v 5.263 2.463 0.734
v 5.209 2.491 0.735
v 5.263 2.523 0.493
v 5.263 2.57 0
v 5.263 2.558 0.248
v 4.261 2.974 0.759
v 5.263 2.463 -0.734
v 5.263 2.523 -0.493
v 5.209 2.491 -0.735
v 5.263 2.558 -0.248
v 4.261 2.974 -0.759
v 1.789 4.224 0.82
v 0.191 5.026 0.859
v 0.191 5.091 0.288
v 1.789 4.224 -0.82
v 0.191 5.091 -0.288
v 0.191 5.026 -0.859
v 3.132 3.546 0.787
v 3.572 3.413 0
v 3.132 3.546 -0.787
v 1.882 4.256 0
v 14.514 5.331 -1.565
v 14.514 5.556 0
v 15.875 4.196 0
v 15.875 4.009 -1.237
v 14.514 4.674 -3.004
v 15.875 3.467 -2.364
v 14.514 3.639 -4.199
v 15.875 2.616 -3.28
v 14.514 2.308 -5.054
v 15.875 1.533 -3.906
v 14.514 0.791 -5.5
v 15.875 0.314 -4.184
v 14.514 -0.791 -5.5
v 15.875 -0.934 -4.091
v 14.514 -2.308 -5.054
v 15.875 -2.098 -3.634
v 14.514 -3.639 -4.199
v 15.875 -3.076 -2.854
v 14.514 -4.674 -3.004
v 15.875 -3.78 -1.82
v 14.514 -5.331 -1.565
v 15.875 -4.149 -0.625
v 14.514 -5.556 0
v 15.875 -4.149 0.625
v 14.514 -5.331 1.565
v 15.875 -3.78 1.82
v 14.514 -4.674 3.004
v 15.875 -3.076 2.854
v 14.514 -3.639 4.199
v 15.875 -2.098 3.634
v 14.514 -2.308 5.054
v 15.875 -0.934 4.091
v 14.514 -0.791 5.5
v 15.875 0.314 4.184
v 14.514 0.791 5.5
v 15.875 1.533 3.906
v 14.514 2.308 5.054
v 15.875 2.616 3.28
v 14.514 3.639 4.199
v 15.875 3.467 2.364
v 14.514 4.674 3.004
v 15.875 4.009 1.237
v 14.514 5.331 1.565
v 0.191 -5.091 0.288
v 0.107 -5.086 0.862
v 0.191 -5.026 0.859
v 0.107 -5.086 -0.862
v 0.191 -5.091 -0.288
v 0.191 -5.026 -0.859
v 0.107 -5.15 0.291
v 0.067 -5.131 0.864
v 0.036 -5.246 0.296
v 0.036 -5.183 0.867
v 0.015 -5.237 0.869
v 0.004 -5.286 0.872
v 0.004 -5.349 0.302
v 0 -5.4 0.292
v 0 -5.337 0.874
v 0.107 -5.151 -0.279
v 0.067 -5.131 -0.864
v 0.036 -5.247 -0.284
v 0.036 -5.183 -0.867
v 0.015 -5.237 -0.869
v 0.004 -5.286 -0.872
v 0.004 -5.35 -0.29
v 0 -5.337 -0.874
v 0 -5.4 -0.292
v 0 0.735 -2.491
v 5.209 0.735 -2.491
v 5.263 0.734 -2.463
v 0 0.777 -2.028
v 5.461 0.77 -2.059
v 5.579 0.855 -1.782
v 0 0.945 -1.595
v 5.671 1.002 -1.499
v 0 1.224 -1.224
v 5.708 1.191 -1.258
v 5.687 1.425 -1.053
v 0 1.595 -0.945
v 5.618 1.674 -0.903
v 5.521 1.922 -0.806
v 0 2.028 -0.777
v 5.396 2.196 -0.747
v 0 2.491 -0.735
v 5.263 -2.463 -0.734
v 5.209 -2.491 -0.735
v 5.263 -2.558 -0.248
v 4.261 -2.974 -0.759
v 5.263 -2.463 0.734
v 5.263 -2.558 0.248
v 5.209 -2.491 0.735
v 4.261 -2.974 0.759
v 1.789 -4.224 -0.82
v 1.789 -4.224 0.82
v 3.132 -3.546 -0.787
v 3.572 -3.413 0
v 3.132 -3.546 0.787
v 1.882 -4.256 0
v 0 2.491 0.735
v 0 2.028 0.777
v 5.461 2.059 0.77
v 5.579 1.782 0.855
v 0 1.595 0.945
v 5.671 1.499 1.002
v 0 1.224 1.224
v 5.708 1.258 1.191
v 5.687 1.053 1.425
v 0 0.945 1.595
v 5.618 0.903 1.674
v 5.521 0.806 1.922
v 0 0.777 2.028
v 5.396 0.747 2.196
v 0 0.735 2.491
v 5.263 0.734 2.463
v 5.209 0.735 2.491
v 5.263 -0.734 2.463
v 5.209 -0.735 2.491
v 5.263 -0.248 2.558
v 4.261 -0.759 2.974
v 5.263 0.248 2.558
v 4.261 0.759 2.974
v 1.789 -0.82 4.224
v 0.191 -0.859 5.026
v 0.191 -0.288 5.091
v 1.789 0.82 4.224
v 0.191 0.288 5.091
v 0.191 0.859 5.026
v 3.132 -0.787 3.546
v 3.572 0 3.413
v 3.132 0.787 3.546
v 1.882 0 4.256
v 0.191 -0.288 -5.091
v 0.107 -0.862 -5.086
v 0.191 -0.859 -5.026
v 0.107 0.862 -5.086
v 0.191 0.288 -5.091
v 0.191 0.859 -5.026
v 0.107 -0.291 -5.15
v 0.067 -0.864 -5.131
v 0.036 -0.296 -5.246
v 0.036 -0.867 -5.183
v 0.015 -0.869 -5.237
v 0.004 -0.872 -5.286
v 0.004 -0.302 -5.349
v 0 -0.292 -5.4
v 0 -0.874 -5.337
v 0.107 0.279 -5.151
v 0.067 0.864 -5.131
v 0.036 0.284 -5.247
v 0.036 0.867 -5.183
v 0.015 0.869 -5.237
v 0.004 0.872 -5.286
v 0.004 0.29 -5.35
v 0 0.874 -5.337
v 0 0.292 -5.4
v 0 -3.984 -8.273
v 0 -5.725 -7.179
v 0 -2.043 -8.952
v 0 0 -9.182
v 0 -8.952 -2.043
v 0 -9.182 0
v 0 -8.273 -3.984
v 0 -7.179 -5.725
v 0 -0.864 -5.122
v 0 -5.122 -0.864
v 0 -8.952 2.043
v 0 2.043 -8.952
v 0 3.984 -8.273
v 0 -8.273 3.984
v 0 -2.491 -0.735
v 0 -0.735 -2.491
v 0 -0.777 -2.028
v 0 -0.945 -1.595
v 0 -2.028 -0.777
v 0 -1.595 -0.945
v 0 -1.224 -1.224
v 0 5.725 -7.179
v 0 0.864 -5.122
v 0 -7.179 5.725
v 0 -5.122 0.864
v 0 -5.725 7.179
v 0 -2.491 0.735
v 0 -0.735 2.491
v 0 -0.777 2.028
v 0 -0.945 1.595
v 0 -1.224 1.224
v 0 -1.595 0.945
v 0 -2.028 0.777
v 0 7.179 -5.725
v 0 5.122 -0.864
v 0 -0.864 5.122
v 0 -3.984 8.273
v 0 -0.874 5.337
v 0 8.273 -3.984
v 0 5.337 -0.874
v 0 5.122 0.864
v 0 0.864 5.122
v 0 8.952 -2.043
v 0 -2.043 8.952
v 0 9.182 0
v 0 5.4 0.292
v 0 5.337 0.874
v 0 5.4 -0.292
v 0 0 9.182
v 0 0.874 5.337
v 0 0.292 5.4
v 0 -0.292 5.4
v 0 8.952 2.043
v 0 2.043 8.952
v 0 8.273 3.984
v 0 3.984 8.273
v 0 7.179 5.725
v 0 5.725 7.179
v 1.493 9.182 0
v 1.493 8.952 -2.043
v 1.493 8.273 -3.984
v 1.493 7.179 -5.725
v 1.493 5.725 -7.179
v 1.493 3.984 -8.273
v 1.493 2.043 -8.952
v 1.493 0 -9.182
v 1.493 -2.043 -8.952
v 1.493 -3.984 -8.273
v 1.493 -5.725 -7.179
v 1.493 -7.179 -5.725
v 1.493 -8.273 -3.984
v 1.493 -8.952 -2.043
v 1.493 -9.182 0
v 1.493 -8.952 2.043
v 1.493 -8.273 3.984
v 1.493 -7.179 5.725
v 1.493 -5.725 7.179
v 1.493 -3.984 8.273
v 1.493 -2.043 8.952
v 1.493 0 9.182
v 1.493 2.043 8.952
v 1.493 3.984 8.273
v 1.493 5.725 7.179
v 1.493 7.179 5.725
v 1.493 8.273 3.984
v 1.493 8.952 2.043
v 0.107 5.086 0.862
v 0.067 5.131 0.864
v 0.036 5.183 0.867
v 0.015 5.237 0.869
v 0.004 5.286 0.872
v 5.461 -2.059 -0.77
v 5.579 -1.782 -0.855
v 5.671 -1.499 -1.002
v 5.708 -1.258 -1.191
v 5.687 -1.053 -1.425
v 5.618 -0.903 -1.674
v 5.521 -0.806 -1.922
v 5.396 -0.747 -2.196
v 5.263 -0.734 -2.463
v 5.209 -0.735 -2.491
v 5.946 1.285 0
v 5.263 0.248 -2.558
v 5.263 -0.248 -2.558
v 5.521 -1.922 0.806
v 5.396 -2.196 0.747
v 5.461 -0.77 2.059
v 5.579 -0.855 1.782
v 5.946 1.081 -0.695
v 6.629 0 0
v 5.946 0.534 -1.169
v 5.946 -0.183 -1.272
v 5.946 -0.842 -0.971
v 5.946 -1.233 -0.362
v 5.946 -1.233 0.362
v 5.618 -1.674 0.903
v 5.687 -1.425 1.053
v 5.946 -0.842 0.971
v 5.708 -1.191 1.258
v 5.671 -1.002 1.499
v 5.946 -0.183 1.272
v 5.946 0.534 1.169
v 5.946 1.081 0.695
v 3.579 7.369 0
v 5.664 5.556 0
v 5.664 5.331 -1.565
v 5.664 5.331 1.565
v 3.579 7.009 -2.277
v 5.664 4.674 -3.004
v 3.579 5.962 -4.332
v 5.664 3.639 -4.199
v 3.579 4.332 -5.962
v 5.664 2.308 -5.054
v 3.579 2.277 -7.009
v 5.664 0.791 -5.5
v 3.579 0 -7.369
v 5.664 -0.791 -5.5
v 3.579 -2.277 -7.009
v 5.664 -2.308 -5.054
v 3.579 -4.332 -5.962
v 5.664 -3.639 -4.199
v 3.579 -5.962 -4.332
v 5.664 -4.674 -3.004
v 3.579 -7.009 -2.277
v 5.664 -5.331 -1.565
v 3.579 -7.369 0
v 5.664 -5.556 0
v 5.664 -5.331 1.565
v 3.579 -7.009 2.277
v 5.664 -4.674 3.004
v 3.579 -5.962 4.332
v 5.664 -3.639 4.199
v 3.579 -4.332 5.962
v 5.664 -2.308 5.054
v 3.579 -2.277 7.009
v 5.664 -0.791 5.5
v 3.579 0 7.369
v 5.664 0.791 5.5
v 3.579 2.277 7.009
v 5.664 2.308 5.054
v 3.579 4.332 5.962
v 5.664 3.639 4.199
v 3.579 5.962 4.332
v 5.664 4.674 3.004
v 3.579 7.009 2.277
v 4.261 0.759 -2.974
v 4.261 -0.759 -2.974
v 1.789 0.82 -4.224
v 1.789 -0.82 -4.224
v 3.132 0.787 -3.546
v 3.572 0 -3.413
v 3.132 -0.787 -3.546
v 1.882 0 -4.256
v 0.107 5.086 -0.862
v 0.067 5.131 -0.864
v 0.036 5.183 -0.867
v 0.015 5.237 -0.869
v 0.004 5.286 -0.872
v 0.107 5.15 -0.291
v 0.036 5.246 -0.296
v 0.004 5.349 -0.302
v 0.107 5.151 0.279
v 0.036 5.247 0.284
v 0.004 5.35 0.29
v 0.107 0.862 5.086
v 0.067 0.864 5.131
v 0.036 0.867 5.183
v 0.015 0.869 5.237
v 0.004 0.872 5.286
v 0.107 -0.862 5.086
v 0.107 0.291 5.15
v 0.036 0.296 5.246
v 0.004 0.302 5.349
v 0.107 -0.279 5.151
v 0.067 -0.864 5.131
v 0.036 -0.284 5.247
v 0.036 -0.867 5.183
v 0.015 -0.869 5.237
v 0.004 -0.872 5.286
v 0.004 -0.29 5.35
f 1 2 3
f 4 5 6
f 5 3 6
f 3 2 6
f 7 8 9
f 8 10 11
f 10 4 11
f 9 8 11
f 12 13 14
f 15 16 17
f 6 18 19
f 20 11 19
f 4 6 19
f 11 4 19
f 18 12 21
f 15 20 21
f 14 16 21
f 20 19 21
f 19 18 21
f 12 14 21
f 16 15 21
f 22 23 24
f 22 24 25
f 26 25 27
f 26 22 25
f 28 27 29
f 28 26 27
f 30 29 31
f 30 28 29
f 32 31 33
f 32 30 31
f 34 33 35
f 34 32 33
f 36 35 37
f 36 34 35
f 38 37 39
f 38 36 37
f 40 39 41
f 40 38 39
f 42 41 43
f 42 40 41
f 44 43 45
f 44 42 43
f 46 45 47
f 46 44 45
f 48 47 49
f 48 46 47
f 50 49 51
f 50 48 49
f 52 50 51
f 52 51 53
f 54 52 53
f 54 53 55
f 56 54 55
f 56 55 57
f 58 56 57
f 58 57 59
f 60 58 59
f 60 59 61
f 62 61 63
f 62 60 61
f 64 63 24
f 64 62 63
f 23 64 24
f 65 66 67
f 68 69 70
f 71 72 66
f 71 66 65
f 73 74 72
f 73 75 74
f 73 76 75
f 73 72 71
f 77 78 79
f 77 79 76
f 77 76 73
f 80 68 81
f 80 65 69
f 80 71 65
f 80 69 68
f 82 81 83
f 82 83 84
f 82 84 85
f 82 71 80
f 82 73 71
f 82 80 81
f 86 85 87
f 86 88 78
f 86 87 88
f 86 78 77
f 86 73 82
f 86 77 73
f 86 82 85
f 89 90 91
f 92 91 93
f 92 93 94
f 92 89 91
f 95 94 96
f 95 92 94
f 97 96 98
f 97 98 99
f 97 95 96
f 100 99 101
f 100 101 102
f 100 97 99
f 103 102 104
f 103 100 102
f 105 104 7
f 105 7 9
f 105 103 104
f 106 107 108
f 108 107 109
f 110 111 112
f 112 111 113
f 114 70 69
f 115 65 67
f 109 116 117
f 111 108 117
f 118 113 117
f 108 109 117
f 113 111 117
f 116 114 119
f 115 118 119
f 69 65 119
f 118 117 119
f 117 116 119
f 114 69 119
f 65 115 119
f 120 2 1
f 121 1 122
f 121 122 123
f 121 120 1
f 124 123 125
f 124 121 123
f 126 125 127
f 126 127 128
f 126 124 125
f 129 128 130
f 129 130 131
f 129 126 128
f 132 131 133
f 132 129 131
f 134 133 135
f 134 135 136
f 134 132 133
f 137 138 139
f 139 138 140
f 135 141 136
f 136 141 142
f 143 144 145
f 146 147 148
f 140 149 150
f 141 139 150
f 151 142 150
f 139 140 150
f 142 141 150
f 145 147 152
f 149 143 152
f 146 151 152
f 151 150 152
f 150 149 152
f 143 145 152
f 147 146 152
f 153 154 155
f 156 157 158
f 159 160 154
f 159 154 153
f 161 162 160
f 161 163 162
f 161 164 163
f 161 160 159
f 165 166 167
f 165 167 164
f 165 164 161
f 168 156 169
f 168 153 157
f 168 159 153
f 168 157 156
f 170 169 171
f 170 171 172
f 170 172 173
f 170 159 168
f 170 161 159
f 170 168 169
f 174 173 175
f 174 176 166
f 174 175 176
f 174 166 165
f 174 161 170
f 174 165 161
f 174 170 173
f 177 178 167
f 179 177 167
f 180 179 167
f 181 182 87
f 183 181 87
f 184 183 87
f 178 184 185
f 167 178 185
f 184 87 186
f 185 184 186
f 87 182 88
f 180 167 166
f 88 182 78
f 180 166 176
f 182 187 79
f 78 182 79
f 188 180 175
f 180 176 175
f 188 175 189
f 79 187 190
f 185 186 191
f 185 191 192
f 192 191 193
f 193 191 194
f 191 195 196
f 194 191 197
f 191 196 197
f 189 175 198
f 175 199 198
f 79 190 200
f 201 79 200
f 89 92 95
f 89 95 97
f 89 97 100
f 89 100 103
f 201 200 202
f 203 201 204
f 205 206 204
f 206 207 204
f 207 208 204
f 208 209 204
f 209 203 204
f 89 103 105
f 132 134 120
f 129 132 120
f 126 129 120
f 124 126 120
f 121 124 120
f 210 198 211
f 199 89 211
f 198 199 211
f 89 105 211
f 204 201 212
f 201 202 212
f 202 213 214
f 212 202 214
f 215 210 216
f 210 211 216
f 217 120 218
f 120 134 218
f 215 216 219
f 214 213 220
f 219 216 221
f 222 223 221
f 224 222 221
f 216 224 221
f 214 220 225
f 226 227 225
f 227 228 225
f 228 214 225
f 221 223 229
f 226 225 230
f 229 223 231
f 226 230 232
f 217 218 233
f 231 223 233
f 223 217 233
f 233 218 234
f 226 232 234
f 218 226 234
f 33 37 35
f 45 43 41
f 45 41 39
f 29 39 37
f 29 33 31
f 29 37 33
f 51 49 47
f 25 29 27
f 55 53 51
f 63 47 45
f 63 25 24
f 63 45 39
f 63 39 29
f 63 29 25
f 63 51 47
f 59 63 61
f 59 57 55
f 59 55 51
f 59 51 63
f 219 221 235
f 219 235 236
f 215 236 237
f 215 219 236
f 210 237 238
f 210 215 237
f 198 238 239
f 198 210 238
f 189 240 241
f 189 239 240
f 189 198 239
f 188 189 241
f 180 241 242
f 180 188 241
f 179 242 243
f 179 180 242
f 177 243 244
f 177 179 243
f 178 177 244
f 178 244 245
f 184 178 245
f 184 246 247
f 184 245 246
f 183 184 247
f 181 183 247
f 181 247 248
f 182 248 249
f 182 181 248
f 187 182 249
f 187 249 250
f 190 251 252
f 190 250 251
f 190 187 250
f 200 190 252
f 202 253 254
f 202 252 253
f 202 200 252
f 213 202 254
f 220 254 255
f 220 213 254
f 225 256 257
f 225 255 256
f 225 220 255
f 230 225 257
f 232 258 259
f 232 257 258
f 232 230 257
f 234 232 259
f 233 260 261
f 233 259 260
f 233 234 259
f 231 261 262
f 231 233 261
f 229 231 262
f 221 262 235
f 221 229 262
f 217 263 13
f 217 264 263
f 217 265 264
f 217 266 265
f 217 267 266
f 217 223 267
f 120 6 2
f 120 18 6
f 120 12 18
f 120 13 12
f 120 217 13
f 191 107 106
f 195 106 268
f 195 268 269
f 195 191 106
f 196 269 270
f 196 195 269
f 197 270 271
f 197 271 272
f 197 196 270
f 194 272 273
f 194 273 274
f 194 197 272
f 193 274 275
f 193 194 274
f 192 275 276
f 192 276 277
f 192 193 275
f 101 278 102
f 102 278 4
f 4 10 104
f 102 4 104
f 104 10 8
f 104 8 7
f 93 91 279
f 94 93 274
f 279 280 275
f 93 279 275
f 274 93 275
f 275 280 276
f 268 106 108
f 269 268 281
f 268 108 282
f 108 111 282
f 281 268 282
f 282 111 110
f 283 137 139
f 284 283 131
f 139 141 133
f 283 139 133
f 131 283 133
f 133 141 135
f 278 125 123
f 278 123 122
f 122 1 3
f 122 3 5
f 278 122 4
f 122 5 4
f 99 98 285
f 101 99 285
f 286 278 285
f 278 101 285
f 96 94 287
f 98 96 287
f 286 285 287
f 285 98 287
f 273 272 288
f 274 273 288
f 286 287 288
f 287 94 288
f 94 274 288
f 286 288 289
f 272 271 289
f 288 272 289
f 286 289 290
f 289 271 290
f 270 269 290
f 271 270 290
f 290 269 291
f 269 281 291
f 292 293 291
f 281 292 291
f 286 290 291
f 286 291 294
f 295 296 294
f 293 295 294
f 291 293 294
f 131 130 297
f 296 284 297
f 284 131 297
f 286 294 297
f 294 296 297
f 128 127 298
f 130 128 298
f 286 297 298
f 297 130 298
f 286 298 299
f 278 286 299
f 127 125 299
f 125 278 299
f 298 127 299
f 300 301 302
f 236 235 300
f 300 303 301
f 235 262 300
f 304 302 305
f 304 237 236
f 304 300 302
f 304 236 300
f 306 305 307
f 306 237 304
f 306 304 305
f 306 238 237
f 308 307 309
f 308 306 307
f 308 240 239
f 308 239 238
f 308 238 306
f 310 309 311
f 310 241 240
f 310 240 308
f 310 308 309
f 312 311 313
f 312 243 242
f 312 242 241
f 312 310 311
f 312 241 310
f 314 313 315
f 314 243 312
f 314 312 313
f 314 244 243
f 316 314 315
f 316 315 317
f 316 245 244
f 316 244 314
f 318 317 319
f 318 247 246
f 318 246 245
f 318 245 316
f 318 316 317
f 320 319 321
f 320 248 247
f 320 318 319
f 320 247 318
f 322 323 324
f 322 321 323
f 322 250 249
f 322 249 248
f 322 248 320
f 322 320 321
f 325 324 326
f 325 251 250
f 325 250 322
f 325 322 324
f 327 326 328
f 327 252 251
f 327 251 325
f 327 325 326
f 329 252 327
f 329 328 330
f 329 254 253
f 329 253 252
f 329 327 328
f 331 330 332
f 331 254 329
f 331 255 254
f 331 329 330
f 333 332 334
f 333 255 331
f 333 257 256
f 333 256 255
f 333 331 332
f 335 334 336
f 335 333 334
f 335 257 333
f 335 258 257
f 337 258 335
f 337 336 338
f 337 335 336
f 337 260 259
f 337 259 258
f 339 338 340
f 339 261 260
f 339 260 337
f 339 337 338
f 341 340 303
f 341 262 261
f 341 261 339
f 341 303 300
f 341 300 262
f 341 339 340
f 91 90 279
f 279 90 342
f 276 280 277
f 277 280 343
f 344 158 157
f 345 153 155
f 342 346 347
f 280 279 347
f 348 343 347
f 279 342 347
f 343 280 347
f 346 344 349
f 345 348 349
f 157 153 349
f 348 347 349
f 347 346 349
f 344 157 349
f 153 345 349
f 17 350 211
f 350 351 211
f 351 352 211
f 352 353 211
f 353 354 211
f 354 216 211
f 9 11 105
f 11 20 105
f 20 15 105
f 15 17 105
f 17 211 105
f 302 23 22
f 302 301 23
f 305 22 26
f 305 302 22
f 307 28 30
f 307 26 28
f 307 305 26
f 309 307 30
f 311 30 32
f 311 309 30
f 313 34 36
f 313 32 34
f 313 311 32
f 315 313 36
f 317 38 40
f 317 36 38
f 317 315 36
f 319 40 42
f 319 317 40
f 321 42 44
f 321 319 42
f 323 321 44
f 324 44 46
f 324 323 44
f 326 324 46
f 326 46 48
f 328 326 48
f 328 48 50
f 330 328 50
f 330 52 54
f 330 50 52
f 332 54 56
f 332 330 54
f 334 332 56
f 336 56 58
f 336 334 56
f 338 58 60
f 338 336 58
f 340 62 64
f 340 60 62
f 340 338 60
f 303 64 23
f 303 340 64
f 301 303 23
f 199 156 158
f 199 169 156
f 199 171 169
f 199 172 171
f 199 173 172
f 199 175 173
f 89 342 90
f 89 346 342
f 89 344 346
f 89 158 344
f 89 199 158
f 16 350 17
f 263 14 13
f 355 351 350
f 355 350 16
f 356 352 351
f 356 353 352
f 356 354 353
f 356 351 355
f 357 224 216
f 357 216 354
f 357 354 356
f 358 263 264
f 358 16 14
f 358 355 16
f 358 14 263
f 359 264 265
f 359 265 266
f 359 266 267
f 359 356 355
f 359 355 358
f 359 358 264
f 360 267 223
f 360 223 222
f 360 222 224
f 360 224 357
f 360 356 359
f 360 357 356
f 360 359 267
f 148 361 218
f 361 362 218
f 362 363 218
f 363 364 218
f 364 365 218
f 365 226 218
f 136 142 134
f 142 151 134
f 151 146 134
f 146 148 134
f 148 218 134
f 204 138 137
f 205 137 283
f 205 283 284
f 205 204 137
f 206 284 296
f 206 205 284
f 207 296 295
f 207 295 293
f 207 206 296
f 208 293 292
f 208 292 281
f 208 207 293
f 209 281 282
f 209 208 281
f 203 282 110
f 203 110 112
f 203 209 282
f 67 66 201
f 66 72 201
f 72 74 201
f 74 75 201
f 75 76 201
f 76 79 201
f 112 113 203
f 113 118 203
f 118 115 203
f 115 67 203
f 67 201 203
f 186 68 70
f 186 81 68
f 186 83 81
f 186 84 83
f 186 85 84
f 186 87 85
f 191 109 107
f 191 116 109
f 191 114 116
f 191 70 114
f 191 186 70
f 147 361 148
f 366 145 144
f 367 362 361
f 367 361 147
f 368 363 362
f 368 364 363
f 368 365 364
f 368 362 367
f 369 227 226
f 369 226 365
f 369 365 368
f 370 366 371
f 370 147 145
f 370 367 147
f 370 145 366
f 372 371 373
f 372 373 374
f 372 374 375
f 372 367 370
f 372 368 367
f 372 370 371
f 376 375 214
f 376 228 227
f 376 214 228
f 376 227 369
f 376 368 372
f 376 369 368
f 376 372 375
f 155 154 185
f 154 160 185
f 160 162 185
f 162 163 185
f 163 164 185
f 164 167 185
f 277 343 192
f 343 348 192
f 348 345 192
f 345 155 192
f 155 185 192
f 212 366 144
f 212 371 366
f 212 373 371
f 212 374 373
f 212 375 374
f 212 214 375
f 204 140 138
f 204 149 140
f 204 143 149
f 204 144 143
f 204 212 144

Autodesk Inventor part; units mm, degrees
ref_plane "YZ Plane" through (0, 0, 0) normal (1, 0, 0) x (0, 1, 0)
ref_plane "XZ Plane" through (0, 0, 0) normal (0, 1, 0) x (-1, 0, 0)
sketch "Sketch1" plane through (0, 0, 0) normal (0, 0, 1) x (1, 0, 0)
  line L0 (6.6294, 0) -> (15.875, 0)
  line L1 (15.875, 0) -> (15.875, 5.5563)
  line L2 (15.875, 5.5563) -> (5.6642, 5.5563)
  line L3 (1.4931, 9.1821) -> (0, 9.1821)
  line L4 (-3.175, 0) -> (19.05, 0) projected
  line L5 (0, -1.8364) -> (0, 11.0185) projected
  line L6 (0, 5.1943) -> (5.2627, 2.5704)
  line L7 (5.2627, 2.5704) -> (6.6294, 0)
  line L8 (5.6642, 5.5563) -> (1.4931, 9.1821)
  line L9 (0, 9.1821) -> (0, 5.1943)
  dimension "d2" = 11.1125
  dimension "d3" = 18.3642
  dimension "d4" = 6.6294
  dimension "d5" = 10.3886
  dimension "d6" = 26.5
  dimension "d7" = 62
  dimension "d13" = 41
  dimension "d14" = 5.6642
  dimension "d15" = 15.875
revolve "Body" add sketch "Sketch1" angle 360 about axis through (6.6294, 0, 0) along (1, 0, 0) contours L7 L6 L5 L3 L8 L2 L1 L0
sketch "Sketch2" plane through (0, 0, 0) normal (-1, 0, 0) x (0, 0, 1)
  line L0 (0, -12.8549) -> (0, 12.8549) projected
  line L1 (-12.8549, 0) -> (12.8549, 0) projected
  line L2 (0, 5.1943) -> (0, 0) construction
  line L3 (0, 0) -> (5.1943, 0) construction
  arc A0 (1.7314, 0) -> (0, 1.7314) centre (0, 0) ccw
  line L4 (0, 0) -> (0.7947, 0.7947) construction
  arc A1 (2.5971, 0) -> (0, 2.5971) centre (0, 0) ccw construction
  line L5 (0.8636, 5.122) -> (0.7354, 2.4908)
  line L6 (5.122, 0.8636) -> (2.4908, 0.7354)
  arc A2 (0.7354, 2.4908) -> (2.4908, 0.7354) centre (2.4093, 2.4093) ccw
  arc A3 (5.1943, 0) -> (5.122, 0.8636) centre (0, 0) ccw
  arc A4 (0.8636, 5.122) -> (0, 5.1943) centre (0, 0) ccw
  arc A5 (5.122, 0.8636) -> (0.8636, 5.122) centre (0, 0) ccw
  line L7 (0.8636, -5.122) -> (0.7354, -2.4908)
  line L8 (5.122, -0.8636) -> (2.4908, -0.7354)
  arc A6 (2.4908, -0.7354) -> (0.7354, -2.4908) centre (2.4093, -2.4093) ccw
  arc A7 (5.122, -0.8636) -> (5.1943, 0) centre (0, 0) ccw
  arc A8 (0, -5.1943) -> (0.8636, -5.122) centre (0, 0) ccw
  arc A9 (0.8636, -5.122) -> (5.122, -0.8636) centre (0, 0) ccw
  line L9 (-0.8636, 5.122) -> (-0.7354, 2.4908)
  line L10 (-5.122, 0.8636) -> (-2.4908, 0.7354)
  arc A10 (-2.4908, 0.7354) -> (-0.7354, 2.4908) centre (-2.4093, 2.4093) ccw
  arc A11 (-5.122, 0.8636) -> (-5.1943, 0) centre (0, 0) ccw
  arc A12 (0, 5.1943) -> (-0.8636, 5.122) centre (0, 0) ccw
  arc A13 (-0.8636, 5.122) -> (-5.122, 0.8636) centre (0, 0) ccw
  arc A14 (-5.122, -0.8636) -> (-0.8636, -5.122) centre (0, 0) ccw
  arc A15 (-0.8636, -5.122) -> (0, -5.1943) centre (0, 0) ccw
  arc A16 (-5.1943, 0) -> (-5.122, -0.8636) centre (0, 0) ccw
  line L11 (-5.122, -0.8636) -> (-2.4908, -0.7354)
  arc A17 (-0.7354, -2.4908) -> (-2.4908, -0.7354) centre (-2.4093, -2.4093) ccw
  line L12 (-0.8636, -5.122) -> (-0.7354, -2.4908)
  dimension "d18" = 45
  dimension "d19" = 3.4629
  dimension "d20" = 5.1943
  dimension "d21" = 10.3886
  dimension "d22" = 0.8636
extrude "Slot" add sketch "Sketch2" against normal up to next contours A2 L5 A5 L6 | L9 A10 L10 A13 | L7 A6 L8 A9 | A14 L11 A17 L12
fillet "Fillet1" radius 0.3454 4 edges at (0, 5.1943, 0) (0, 0, 5.1943) (0, -5.1943, 0) (0, 0, -5.1943)
thread "Thread" size "7/16-14 UNC" class "2A" standard "ANSI Unified Screw Threads" length 5.6756
chamfer "Chamfer1" distance 1.3606 distance2 1.3606 1 edges at (15.875, -5.5563, 0) measured on face at (15.875, 2.9153, 1.1751)
ref_plane "Work Plane2" through (2.032, 0, 0) normal (0, 1, 0) x (1, 0, 0)
equation "\"d2\" = GD"
equation "\"d3\" = KOD"
equation "\"d4\" = INTI"
equation "\"d5\" = SDM"
equation "\"d13\" = 0.5 * SEWI"
equation "\"d14\" = KOH"
equation "\"d15\" = NLG"
equation "\"d19\" = 0.333333 * SDM"
equation "\"d20\" = 0.5 * SDM"
equation "\"d21\" = SDM"
equation "\"d22\" = 0.5 * SBR"
equation "\"d45\" = INTI"
equation "\"d25\" = 0.2 * SBR"
equation "\"d9\" = GEL"
equation "\"d11\" = -0.5 * SPD + 0.5 * GD"
equation "\"d12\" = GUL"
equation "\"GD\" = NND"
equation "\"NLG\" = 15.875"
equation "\"GEL\" = 5.67563"
equation "\"KOD\" = 18.3642"
equation "\"KOH\" = 5.6642"
equation "\"SDM\" = 10.3886"
equation "\"INTI\" = 6.6294"
equation "\"SBR\" = 1.7272"
equation "\"GUL\" = 0.75 * GAL"
equation "\"SPD\" = 8.3914"
equation "\"SEWI\" = 82deg"
equation "\"d0\" = NLG"
equation "\"d1\" = KOH"
equation "\"d17\" = SDM"
equation "\"TOA\" = 30deg"
equation "\"THREADDIA\" = 11.1125"
equation "\"BDM\" = NND"
equation "\"NND\" = 11.1125"
equation "\"GAL\" = 1.81407"
equation "\"GD1\" = SPD"
properties part number "ANSI B18.6.3 - 7/16-14 x 5/8, CRFCHMSTII(5)" material "Steel, Mild"
